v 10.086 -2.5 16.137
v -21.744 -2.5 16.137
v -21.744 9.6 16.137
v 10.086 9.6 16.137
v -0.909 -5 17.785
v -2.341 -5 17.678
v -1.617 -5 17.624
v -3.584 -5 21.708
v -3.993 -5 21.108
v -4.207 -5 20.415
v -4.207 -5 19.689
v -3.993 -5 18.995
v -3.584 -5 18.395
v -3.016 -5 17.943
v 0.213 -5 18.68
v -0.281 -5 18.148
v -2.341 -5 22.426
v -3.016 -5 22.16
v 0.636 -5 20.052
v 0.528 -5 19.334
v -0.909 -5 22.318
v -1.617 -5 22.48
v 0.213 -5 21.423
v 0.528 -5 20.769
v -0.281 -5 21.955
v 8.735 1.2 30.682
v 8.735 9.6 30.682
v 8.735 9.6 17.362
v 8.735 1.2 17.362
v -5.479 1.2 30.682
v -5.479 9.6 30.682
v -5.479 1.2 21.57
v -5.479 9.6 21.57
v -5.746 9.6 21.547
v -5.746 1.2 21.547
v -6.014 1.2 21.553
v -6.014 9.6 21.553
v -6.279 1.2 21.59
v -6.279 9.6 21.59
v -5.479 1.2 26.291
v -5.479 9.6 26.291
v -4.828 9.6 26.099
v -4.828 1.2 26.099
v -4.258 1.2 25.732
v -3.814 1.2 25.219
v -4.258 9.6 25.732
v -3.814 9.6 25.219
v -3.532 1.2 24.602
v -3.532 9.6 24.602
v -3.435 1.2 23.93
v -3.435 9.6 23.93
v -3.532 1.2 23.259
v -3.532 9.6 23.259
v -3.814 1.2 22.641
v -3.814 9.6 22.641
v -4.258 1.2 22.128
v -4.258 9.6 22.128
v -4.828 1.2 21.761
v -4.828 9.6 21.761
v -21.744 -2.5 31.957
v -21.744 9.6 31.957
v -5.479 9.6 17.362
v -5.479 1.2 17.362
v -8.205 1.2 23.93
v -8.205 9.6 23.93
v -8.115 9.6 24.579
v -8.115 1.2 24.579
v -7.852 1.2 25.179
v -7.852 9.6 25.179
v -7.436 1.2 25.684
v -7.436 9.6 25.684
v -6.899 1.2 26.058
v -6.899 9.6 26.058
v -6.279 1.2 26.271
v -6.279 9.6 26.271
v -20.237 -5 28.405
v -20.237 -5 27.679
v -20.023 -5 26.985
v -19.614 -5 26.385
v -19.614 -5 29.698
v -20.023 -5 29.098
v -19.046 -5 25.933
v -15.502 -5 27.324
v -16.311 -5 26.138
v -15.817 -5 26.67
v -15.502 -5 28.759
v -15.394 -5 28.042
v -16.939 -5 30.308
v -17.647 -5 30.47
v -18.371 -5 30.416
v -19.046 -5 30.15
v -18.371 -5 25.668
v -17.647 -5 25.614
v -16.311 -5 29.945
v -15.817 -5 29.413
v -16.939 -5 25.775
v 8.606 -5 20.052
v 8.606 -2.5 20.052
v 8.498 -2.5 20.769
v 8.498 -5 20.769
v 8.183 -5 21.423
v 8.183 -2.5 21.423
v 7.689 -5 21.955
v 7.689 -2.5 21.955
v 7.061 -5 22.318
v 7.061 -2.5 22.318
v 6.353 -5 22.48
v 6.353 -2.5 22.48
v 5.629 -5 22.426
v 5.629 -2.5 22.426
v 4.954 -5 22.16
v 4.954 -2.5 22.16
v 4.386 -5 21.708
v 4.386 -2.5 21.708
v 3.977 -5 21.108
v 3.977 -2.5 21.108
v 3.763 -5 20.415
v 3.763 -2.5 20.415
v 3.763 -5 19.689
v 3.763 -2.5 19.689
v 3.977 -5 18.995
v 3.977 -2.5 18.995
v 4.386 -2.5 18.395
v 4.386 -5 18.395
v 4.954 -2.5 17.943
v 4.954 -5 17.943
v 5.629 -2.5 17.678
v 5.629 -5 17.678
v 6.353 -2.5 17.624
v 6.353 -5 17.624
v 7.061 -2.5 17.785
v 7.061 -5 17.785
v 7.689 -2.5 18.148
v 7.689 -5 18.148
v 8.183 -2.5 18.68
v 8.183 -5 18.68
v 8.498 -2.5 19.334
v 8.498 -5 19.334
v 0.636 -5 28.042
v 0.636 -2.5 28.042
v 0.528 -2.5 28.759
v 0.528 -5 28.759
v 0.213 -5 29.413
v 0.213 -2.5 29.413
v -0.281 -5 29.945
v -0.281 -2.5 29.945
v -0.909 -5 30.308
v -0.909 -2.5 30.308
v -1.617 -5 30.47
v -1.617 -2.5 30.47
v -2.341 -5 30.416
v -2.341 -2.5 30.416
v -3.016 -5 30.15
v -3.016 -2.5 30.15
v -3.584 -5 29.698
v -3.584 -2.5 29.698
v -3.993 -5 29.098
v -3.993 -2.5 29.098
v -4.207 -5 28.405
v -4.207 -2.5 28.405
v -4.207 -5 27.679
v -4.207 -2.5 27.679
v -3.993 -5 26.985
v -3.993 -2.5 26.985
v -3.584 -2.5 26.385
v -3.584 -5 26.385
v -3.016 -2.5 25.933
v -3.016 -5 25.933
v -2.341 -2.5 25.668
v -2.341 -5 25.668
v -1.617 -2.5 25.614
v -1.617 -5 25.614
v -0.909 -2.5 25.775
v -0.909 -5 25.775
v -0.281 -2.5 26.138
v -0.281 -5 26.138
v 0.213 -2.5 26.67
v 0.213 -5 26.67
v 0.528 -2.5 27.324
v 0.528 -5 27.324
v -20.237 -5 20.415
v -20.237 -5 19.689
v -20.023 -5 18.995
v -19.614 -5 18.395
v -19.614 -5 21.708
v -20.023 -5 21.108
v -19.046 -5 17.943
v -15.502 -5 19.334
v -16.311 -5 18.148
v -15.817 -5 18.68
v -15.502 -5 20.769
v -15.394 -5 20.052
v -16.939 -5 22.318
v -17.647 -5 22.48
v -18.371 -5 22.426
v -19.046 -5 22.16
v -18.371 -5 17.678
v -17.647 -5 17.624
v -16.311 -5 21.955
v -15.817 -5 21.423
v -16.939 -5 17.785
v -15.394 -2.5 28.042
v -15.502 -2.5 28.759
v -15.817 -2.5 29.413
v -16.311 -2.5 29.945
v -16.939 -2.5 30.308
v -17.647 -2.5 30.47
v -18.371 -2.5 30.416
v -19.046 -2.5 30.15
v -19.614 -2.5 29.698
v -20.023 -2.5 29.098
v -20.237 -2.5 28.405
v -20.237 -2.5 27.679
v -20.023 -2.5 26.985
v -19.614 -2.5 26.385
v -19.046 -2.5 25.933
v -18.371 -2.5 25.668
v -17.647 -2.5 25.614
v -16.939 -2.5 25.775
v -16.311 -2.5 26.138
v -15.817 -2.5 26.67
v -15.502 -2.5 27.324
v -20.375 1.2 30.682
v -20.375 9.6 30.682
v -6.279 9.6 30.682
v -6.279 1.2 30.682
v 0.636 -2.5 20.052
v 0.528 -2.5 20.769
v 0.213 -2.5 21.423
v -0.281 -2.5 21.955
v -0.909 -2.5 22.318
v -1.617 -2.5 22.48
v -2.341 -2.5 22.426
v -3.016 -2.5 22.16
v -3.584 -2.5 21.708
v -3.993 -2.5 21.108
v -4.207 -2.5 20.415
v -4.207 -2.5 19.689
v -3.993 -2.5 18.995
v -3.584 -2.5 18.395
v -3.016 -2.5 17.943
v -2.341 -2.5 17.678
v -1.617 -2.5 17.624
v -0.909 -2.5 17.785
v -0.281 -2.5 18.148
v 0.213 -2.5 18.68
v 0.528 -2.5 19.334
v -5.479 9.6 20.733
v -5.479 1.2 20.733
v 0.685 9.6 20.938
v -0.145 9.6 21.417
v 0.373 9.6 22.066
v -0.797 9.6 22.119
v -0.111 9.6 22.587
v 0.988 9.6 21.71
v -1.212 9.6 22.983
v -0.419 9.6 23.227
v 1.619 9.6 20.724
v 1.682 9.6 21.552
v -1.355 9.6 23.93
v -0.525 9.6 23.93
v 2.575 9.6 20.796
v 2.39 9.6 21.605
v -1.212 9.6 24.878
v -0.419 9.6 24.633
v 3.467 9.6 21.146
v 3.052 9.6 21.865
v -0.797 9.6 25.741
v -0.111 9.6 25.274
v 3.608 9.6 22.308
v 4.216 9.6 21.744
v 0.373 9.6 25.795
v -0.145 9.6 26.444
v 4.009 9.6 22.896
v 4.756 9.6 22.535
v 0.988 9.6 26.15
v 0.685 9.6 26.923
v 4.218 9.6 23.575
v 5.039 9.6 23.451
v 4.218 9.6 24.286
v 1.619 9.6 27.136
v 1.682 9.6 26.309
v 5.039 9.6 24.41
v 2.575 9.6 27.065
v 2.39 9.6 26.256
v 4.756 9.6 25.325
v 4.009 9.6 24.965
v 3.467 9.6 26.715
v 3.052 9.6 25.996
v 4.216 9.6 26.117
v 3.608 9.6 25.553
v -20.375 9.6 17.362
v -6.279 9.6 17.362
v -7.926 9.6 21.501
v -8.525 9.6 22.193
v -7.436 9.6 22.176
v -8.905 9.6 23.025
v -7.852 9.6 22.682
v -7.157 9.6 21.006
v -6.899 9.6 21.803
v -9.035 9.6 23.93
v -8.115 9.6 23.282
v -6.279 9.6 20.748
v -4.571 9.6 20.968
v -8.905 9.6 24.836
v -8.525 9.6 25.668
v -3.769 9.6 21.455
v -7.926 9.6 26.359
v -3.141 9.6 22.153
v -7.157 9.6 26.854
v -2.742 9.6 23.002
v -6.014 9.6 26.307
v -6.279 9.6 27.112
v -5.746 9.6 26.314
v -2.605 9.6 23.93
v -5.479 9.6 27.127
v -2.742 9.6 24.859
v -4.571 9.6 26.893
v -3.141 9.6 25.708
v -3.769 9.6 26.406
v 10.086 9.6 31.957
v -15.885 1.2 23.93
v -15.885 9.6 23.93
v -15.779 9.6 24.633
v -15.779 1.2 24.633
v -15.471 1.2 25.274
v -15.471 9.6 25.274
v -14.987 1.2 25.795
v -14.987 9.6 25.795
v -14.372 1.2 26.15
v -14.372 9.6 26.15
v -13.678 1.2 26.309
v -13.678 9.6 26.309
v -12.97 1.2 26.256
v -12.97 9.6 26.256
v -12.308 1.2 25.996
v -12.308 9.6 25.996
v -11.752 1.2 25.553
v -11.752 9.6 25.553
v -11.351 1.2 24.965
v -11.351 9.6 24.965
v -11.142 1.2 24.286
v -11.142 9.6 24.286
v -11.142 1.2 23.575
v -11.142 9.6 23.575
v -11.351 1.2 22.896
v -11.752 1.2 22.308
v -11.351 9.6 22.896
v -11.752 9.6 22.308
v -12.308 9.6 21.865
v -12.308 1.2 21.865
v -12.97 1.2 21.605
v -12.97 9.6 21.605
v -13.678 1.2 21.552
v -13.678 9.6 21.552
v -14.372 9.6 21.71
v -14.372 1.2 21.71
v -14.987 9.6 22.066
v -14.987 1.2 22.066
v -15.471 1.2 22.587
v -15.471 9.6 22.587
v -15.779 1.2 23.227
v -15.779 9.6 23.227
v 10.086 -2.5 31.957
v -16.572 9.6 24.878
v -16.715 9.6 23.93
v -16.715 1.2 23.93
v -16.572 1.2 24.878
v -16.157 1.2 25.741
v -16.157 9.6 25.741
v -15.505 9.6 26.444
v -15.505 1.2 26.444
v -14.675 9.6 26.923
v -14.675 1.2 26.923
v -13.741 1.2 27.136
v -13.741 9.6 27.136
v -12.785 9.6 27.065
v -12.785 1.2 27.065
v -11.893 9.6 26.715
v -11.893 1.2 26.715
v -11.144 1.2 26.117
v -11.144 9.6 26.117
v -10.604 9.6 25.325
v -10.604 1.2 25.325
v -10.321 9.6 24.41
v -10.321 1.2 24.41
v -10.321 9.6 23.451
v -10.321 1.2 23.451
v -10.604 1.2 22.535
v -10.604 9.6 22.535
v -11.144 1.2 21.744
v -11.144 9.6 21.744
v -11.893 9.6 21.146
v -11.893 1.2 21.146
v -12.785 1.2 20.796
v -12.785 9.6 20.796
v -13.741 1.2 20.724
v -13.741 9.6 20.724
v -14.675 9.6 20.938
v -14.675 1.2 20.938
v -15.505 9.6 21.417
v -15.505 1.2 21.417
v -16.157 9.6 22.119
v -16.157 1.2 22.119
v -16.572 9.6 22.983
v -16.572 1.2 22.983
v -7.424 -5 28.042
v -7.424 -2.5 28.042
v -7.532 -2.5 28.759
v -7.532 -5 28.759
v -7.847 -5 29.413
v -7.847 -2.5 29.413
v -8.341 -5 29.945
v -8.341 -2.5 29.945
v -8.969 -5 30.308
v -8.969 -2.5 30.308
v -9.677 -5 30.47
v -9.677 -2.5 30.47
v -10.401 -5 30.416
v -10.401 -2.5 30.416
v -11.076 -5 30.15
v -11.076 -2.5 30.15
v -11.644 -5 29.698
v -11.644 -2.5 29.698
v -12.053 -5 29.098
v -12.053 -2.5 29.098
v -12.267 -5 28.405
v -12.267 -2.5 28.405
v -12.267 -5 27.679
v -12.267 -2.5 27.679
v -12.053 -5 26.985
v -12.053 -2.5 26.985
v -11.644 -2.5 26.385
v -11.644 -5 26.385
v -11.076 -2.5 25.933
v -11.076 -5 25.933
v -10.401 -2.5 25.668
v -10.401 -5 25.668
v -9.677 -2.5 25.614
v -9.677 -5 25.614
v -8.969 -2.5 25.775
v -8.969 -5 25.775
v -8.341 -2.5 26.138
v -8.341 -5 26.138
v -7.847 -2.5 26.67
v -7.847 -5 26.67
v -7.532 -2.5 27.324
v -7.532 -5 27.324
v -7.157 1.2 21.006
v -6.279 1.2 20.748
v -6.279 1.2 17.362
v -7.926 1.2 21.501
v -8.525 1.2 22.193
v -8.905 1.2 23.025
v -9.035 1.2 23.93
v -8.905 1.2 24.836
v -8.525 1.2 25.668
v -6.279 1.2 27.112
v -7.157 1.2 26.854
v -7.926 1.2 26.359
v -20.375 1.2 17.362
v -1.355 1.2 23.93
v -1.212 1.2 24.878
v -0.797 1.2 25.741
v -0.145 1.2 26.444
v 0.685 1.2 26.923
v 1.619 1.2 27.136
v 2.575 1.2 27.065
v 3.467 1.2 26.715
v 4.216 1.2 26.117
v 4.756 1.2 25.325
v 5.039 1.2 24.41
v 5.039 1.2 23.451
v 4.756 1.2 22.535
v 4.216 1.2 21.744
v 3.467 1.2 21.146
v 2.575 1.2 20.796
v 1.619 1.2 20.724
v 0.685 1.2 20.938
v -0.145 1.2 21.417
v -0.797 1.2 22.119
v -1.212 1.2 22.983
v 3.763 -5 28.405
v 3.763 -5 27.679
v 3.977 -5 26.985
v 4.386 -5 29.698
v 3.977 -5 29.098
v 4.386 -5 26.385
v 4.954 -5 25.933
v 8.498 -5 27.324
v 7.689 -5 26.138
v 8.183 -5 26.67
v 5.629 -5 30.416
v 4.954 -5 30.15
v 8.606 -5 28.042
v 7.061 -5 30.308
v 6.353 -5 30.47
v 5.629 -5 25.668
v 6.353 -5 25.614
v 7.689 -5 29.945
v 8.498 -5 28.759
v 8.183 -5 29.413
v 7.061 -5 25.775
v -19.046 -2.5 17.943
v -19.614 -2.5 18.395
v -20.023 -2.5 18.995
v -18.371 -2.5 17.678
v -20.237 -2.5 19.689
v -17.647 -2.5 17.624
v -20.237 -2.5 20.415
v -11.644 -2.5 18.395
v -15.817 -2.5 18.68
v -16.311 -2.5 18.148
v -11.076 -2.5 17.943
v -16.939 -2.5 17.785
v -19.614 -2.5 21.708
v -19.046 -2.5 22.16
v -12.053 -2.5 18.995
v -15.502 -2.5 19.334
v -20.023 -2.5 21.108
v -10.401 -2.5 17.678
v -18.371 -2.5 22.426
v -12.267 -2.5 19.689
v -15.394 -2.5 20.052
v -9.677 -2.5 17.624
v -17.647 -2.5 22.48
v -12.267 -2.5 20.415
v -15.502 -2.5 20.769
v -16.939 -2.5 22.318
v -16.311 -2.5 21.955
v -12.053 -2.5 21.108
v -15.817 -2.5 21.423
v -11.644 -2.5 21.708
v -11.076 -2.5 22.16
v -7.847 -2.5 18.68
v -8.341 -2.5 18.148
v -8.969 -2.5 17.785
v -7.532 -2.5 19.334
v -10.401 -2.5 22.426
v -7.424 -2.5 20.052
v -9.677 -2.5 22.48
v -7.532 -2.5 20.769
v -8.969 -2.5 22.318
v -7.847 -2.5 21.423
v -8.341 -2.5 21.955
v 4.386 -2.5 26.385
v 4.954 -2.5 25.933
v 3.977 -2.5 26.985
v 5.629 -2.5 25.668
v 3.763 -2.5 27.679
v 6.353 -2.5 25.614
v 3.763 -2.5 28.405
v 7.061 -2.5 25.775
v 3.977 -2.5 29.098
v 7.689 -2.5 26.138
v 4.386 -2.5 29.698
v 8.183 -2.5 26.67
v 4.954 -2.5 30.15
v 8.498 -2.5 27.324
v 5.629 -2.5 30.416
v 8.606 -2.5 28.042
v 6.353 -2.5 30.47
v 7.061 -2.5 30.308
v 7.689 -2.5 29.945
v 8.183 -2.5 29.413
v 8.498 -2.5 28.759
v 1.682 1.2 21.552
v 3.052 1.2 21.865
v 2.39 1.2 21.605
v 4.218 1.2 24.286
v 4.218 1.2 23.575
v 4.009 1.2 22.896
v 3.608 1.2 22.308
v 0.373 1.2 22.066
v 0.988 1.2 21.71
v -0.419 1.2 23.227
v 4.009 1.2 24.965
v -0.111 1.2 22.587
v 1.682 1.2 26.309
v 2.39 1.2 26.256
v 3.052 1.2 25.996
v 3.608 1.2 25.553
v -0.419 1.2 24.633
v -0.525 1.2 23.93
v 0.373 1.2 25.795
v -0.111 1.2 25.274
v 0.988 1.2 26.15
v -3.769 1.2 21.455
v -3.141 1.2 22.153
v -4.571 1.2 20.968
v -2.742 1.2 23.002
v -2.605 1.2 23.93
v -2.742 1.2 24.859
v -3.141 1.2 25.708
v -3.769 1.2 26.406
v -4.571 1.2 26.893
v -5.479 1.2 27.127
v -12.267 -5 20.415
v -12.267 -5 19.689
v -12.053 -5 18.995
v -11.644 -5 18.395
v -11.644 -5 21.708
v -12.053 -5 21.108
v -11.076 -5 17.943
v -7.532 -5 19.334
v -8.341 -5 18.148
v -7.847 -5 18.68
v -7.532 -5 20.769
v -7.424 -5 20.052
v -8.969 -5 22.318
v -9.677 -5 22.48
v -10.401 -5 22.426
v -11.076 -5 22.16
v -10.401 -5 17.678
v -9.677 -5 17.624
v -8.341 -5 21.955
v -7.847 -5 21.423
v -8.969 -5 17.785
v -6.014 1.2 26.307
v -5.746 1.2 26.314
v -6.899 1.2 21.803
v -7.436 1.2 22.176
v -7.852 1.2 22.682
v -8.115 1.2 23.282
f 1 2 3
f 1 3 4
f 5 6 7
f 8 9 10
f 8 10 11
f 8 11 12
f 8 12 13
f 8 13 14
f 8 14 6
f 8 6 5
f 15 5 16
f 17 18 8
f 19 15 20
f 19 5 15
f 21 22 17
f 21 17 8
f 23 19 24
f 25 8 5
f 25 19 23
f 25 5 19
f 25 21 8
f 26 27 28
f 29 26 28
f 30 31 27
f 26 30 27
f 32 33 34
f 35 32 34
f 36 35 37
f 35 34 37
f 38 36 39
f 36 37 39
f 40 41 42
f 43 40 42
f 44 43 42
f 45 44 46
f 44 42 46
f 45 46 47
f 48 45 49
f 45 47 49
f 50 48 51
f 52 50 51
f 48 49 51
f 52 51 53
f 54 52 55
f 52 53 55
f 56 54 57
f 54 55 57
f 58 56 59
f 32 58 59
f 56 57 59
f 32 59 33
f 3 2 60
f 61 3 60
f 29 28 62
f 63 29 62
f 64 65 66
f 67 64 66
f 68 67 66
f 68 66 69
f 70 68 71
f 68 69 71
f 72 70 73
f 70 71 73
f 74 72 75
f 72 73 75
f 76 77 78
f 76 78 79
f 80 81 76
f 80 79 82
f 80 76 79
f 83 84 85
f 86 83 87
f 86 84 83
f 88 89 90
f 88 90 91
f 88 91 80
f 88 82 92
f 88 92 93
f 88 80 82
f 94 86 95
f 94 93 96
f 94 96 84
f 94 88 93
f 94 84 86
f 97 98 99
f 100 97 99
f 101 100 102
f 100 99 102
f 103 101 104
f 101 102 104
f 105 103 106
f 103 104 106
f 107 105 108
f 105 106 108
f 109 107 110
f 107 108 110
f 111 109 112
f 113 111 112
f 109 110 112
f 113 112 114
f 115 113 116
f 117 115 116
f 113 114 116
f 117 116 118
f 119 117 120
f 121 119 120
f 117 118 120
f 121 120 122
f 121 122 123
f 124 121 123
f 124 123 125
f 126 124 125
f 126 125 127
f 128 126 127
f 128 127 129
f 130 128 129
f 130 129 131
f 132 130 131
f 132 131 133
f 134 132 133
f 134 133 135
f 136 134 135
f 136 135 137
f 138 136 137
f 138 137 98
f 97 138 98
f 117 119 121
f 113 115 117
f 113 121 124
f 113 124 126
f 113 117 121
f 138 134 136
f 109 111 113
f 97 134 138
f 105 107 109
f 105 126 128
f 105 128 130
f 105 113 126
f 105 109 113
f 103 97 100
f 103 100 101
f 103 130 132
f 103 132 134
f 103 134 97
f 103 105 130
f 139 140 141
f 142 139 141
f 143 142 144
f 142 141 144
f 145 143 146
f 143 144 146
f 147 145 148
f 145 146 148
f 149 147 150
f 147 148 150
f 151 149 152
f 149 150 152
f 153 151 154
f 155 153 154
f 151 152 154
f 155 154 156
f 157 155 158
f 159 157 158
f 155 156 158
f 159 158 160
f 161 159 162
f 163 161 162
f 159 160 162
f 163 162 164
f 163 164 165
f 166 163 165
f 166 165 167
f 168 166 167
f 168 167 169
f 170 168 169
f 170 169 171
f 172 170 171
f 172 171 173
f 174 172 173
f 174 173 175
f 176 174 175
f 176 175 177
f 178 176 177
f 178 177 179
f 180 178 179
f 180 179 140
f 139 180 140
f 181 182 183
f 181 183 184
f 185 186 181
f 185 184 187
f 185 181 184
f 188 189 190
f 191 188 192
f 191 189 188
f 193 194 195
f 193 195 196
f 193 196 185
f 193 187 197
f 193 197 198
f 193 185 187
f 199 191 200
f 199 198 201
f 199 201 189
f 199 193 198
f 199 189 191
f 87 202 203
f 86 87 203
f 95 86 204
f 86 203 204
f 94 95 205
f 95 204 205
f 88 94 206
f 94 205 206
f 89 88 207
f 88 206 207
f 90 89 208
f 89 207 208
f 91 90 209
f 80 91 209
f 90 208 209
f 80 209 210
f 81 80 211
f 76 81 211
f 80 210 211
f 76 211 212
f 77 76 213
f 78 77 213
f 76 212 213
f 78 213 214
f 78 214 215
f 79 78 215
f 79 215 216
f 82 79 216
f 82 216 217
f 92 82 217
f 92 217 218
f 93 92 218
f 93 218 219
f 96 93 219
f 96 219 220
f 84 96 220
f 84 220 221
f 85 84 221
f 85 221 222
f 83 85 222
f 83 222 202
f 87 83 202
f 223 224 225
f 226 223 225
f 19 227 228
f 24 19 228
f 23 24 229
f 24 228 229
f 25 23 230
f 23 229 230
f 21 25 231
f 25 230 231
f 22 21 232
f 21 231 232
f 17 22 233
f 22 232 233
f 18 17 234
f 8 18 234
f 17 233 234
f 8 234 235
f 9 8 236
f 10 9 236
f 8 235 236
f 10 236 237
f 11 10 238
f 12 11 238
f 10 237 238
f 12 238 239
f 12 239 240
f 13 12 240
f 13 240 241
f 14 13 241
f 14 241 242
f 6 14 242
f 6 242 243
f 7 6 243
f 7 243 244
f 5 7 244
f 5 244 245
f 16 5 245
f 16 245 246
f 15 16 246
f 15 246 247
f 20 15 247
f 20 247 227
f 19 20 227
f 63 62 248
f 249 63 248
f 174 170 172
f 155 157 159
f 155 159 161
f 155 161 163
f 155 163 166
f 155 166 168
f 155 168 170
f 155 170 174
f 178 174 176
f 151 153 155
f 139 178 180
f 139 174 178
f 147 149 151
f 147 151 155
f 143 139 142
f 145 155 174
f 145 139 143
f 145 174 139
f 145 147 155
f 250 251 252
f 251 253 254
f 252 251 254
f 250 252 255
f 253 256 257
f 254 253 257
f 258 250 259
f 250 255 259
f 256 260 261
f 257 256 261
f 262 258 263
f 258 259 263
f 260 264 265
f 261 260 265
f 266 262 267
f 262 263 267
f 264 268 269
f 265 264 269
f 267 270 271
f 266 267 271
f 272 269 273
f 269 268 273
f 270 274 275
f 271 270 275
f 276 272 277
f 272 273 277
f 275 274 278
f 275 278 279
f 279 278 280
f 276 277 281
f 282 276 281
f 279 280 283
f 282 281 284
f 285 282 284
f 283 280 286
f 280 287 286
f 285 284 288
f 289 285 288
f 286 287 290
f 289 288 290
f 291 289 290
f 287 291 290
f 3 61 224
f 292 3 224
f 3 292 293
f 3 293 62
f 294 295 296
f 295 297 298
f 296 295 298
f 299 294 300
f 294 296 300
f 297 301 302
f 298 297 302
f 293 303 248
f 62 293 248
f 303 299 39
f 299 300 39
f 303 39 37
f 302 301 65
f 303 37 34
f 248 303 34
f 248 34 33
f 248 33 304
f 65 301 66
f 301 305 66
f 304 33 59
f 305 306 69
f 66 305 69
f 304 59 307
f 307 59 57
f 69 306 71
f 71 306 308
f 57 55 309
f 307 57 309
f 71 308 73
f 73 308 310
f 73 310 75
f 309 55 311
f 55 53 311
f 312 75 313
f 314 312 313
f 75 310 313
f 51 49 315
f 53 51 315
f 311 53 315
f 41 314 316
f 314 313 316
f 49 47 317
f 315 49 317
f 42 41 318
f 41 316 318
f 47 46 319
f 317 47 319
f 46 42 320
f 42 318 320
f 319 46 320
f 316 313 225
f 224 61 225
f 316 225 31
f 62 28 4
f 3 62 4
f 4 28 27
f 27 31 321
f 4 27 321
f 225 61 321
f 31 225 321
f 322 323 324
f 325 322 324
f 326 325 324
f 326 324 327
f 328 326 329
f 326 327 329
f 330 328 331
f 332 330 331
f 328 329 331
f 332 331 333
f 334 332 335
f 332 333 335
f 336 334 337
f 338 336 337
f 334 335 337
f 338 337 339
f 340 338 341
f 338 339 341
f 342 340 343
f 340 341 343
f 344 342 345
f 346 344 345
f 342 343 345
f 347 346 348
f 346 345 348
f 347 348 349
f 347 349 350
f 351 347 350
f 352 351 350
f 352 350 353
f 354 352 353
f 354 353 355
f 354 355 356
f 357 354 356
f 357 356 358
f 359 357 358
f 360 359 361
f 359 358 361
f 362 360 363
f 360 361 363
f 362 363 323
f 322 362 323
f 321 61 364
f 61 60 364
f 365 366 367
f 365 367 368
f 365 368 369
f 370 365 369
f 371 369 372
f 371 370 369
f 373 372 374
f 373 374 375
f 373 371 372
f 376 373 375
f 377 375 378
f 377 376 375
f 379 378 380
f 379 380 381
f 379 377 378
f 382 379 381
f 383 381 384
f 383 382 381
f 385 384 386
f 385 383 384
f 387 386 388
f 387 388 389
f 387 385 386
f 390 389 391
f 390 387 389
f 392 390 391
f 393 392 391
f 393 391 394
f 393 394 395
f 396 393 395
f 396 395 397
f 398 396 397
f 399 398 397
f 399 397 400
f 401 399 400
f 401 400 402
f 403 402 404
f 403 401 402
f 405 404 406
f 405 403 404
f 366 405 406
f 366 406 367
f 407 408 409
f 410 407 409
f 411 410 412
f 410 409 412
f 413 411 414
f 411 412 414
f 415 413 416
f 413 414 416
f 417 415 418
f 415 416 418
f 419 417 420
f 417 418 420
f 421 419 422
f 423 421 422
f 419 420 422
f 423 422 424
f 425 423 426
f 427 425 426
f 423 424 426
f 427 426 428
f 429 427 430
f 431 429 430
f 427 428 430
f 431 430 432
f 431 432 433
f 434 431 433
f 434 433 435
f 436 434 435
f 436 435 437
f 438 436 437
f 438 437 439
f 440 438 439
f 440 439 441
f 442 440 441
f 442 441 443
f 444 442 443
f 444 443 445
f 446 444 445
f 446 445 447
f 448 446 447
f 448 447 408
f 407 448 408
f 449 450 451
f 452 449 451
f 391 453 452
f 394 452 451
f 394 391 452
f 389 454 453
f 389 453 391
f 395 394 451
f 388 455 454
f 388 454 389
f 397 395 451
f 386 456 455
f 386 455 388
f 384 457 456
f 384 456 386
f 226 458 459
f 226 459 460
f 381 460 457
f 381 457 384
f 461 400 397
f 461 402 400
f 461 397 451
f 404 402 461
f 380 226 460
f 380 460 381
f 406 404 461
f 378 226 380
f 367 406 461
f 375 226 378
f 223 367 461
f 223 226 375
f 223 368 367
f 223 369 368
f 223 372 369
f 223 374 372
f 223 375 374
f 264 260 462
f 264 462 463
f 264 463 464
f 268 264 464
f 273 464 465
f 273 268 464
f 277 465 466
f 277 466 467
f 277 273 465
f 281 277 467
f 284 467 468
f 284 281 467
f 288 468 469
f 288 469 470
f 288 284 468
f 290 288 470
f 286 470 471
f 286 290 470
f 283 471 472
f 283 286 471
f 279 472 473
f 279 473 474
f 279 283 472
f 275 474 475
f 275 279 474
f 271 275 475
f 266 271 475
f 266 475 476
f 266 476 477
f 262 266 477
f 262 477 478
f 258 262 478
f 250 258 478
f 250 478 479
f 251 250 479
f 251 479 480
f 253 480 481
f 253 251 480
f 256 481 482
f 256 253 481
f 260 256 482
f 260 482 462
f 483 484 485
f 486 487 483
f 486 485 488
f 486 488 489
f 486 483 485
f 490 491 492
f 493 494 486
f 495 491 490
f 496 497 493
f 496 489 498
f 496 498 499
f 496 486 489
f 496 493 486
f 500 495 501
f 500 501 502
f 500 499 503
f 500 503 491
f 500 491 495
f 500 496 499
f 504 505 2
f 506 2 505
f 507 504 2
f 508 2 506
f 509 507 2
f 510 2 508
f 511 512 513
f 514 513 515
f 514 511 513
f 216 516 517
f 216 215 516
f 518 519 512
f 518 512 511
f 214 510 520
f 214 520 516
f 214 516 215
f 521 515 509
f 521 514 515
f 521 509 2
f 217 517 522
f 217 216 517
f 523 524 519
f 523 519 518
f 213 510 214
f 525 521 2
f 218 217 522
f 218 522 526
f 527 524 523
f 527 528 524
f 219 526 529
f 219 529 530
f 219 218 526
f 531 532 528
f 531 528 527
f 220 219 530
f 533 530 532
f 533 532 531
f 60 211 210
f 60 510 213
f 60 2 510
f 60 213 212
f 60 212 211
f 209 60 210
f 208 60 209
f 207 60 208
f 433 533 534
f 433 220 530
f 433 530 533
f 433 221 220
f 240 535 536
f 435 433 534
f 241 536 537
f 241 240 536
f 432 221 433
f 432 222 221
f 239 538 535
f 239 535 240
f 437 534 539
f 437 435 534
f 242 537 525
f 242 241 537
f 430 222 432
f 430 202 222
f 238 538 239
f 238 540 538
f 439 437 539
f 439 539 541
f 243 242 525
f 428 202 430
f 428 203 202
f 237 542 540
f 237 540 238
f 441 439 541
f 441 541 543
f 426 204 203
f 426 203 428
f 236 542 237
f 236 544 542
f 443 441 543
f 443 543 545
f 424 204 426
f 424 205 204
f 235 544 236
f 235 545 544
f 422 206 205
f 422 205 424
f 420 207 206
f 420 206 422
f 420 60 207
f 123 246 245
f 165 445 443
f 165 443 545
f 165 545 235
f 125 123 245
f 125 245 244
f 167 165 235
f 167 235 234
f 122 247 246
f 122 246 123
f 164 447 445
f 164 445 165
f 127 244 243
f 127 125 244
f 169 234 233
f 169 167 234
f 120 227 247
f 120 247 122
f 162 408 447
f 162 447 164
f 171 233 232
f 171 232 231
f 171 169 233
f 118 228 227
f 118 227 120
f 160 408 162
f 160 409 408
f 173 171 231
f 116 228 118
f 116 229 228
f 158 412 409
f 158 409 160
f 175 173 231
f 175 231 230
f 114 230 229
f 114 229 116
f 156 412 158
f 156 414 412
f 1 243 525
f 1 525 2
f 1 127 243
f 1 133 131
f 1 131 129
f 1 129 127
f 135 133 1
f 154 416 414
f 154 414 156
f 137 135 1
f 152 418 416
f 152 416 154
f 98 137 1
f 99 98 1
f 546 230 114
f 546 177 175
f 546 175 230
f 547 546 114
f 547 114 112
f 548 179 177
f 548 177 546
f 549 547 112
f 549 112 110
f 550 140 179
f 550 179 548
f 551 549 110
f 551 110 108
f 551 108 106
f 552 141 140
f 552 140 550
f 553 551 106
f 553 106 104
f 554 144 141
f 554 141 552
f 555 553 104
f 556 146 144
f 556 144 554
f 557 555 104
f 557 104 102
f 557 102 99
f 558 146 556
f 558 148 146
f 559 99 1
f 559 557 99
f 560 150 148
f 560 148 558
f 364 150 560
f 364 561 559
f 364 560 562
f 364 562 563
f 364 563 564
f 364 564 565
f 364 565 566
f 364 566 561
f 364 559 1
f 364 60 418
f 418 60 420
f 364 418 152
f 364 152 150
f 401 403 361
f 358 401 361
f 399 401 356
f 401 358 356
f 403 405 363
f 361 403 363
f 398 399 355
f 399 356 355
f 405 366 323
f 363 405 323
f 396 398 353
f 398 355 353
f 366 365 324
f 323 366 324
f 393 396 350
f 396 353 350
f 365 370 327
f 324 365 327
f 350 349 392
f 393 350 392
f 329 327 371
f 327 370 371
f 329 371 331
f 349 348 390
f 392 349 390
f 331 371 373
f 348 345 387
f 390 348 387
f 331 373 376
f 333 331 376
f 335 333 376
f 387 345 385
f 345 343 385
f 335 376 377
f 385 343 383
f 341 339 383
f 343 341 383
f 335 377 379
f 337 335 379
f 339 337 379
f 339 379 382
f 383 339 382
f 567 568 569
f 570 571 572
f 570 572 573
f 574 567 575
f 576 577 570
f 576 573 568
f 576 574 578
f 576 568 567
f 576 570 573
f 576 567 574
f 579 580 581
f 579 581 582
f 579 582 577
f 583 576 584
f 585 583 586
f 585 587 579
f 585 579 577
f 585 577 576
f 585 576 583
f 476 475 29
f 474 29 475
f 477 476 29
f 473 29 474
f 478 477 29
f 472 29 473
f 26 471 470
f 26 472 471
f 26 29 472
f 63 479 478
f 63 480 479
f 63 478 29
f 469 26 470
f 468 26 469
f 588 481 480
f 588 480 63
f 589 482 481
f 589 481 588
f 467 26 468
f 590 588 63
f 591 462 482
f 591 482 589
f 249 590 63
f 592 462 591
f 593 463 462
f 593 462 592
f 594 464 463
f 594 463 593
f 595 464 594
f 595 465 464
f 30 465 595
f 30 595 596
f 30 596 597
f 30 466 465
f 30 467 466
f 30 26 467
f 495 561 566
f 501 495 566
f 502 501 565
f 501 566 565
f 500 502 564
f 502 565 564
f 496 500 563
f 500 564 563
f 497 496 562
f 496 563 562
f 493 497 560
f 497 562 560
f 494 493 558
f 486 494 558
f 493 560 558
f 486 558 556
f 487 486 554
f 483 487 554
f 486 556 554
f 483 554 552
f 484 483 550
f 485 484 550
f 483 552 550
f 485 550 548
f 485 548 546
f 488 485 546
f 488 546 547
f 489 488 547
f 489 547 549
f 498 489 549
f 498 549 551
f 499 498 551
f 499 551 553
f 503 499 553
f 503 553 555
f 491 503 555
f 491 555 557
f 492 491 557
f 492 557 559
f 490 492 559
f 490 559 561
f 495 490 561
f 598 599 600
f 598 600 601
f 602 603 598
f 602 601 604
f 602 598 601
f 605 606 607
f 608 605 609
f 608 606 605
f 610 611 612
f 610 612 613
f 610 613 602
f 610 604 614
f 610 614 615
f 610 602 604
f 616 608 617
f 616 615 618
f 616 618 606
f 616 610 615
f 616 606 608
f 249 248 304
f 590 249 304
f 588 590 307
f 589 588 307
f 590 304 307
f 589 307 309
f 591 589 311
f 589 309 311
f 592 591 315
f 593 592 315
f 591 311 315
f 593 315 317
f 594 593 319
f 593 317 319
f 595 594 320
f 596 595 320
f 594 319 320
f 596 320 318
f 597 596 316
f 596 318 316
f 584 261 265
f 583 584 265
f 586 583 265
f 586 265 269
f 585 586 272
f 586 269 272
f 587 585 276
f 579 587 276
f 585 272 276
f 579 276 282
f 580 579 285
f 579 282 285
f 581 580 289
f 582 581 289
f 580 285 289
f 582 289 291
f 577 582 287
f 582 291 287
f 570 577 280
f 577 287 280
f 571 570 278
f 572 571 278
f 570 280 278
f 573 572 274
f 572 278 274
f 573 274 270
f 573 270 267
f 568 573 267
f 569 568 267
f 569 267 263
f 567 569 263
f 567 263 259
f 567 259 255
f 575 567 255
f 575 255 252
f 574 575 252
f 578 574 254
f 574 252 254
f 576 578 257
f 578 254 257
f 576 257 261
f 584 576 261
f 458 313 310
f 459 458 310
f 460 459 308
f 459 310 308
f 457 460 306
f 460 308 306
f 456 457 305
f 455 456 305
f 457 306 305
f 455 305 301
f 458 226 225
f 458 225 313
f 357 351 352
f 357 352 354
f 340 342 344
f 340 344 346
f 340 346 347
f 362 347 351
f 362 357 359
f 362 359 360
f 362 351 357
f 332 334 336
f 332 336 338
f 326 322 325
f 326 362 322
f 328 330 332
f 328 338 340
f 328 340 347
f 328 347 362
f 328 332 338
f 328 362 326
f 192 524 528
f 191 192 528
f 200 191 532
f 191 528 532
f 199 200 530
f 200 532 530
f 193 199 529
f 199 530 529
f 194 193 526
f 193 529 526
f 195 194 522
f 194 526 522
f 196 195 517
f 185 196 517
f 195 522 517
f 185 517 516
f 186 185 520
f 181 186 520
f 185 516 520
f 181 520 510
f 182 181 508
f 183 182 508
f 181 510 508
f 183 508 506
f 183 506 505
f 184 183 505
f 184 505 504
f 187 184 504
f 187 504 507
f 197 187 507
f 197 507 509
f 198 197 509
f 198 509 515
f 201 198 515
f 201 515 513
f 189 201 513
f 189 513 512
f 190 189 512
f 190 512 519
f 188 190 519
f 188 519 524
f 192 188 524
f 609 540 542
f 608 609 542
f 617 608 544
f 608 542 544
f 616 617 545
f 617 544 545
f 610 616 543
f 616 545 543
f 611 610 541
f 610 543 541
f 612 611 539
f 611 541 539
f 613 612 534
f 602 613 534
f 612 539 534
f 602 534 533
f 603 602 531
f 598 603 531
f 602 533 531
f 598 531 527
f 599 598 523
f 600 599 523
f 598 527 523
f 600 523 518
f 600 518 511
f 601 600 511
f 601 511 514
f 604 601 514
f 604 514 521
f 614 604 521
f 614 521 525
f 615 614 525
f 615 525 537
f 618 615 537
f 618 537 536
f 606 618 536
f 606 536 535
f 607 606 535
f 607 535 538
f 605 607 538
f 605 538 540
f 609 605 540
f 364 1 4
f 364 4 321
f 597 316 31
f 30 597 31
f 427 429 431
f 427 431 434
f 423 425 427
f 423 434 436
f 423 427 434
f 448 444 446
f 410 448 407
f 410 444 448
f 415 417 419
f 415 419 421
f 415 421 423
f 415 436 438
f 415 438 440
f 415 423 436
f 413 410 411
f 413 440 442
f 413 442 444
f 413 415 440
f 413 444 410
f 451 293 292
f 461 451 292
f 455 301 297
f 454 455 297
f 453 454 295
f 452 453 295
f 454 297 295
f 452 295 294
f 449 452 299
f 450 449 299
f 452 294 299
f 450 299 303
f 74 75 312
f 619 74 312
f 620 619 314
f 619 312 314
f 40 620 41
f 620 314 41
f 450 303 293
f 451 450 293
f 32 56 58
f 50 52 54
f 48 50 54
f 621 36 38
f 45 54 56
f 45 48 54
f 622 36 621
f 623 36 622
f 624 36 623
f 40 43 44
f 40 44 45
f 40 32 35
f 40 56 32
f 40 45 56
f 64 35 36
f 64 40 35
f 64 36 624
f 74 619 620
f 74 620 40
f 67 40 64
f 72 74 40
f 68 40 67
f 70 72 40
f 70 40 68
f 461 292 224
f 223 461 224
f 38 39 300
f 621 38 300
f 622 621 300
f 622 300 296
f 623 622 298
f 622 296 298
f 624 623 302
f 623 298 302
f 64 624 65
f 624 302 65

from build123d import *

# Parameters (mm, degrees)
F0_W          = 31.83
F0_H          = 15.82
F0_R          = 2.435
F1_DEPTH      = 2.5
F1_DEPTH_BACK = 9.6
F2_DEPTH      = 5
F3_R          = 3.215
F3_R_2        = 2.385
F4_DEPTH      = 8.4


with BuildPart() as f1:
    # F0 (on Front) → F1 (new body, two sides)
    with BuildSketch(Plane.XZ) as f1_sk:
        with Locations((-5.828721876, 24.0466938629)):
            Rectangle(F0_W, F0_H)
        with Locations((-17.828721876, 20.0516938629)):
            Circle(F0_R, mode=Mode.SUBTRACT)
        with Locations((-9.858721876, 20.0516938629)):
            Circle(F0_R, mode=Mode.SUBTRACT)
        with Locations((-1.798721876, 20.0516938629)):
            Circle(F0_R, mode=Mode.SUBTRACT)
        with Locations((6.171278124, 20.0516938629)):
            Circle(F0_R, mode=Mode.SUBTRACT)
        with Locations((-17.828721876, 28.0416938629)):
            Circle(F0_R, mode=Mode.SUBTRACT)
        with Locations((-9.858721876, 28.0416938629)):
            Circle(F0_R, mode=Mode.SUBTRACT)
        with Locations((-1.798721876, 28.0416938629)):
            Circle(F0_R, mode=Mode.SUBTRACT)
        with Locations((6.171278124, 28.0416938629)):
            Circle(F0_R, mode=Mode.SUBTRACT)
        with Locations((-1.798721876, 28.0416938629)):
            Circle(F0_R)
        with Locations((-9.858721876, 28.0416938629)):
            Circle(F0_R)
        with Locations((-17.828721876, 28.0416938629)):
            Circle(F0_R)
        with Locations((-17.828721876, 20.0516938629)):
            Circle(F0_R)
        with Locations((-9.858721876, 20.0516938629)):
            Circle(F0_R)
        with Locations((-1.798721876, 20.0516938629)):
            Circle(F0_R)
        with Locations((6.171278124, 20.0516938629)):
            Circle(F0_R)
        with Locations((6.171278124, 28.0416938629)):
            Circle(F0_R)
    extrude(amount=F1_DEPTH)
    extrude(f1_sk.sketch, amount=-F1_DEPTH_BACK)

    # F0 (on Front) → F2 (join)
    with BuildSketch(Plane.XZ):
        with Locations((-17.828721876, 28.0416938629)):
            Circle(F0_R)
        with Locations((-17.828721876, 20.0516938629)):
            Circle(F0_R)
        with Locations((-9.858721876, 28.0416938629)):
            Circle(F0_R)
        with Locations((-9.858721876, 20.0516938629)):
            Circle(F0_R)
        with Locations((-1.798721876, 28.0416938629)):
            Circle(F0_R)
        with Locations((-1.798721876, 20.0516938629)):
            Circle(F0_R)
        with Locations((6.171278124, 28.0416938629)):
            Circle(F0_R)
        with Locations((6.171278124, 20.0516938629)):
            Circle(F0_R)
    extrude(amount=F2_DEPTH)

    # F3 (on face) → F4 (cut)
    with BuildSketch(Plane(origin=(0, 9.6, 0), x_dir=(-1, 0, 0), z_dir=(0, 1, 0))):
        with BuildLine():
            Line((5.4793441668, 30.6818692116), (-8.7347330976, 30.6818692116))
            Line((-8.7347330976, 30.6818692116), (-8.7347330976, 17.3618692116))
            Line((-8.7347330976, 17.3618692116), (5.4793441668, 17.3618692116))
            Line((5.4793441668, 17.3618692116), (5.4793441668, 20.733492265))
            ThreePointArc((5.4793441668, 20.733492265), (2.6052669024, 23.9303652197), (5.4793441668, 27.1272381744))
            Line((5.4793441668, 27.1272381744), (5.4793441668, 30.6818692116))
        make_face()
        with Locations((-1.8597330976, 23.9303652197)):
            Circle(F3_R, mode=Mode.SUBTRACT)
        with BuildLine():
            Line((6.6202669024, 30.6818692116), (6.2793441668, 30.6818692116))
            Line((6.2793441668, 30.6818692116), (6.2793441668, 27.1124200692))
            ThreePointArc((6.2793441668, 27.1124200692), (8.2505095246, 26.0351563727), (9.0352669024, 23.9303652197))
            ThreePointArc((9.0352669024, 23.9303652197), (8.2505095246, 21.8255740668), (6.2793441668, 20.7483103702))
            Line((6.2793441668, 20.7483103702), (6.2793441668, 17.3618692116))
            Line((6.2793441668, 17.3618692116), (6.6202669024, 17.3618692116))
            Line((6.6202669024, 17.3618692116), (20.3752669024, 17.3618692116))
            Line((20.3752669024, 17.3618692116), (20.3752669024, 30.6818692116))
            Line((20.3752669024, 30.6818692116), (6.6202669024, 30.6818692116))
        make_face()
        with Locations((13.5002669024, 23.9303652197)):
            Circle(F3_R, mode=Mode.SUBTRACT)
        with Locations((-1.8597330976, 23.9303652197)):
            Circle(F3_R_2)
        with Locations((13.5002669024, 23.9303652197)):
            Circle(F3_R_2)
        with BuildLine():
            Line((5.4793441668, 21.5698575014), (5.4793441668, 26.290872938))
            ThreePointArc((5.4793441668, 26.290872938), (3.4352669024, 23.9303652197), (5.4793441668, 21.5698575014))
        make_face()
        with BuildLine():
            ThreePointArc((8.2052669024, 23.9303652197), (7.6618863359, 25.4458396874), (6.2793441668, 26.2707654131))
            Line((6.2793441668, 26.2707654131), (6.2793441668, 21.5899650263))
            ThreePointArc((6.2793441668, 21.5899650263), (7.6618863359, 22.414890752), (8.2052669024, 23.9303652197))
        make_face()
        with BuildLine():
            ThreePointArc((6.2793441668, 26.2707654131), (5.8801935351, 26.3146122285), (5.4793441668, 26.290872938))
            Line((5.4793441668, 26.290872938), (5.4793441668, 21.5698575014))
            ThreePointArc((5.4793441668, 21.5698575014), (5.8801935351, 21.546118211), (6.2793441668, 21.5899650263))
            Line((6.2793441668, 21.5899650263), (6.2793441668, 26.2707654131))
        make_face()
    extrude(amount=-F4_DEPTH, mode=Mode.SUBTRACT)


solid = f1.part
